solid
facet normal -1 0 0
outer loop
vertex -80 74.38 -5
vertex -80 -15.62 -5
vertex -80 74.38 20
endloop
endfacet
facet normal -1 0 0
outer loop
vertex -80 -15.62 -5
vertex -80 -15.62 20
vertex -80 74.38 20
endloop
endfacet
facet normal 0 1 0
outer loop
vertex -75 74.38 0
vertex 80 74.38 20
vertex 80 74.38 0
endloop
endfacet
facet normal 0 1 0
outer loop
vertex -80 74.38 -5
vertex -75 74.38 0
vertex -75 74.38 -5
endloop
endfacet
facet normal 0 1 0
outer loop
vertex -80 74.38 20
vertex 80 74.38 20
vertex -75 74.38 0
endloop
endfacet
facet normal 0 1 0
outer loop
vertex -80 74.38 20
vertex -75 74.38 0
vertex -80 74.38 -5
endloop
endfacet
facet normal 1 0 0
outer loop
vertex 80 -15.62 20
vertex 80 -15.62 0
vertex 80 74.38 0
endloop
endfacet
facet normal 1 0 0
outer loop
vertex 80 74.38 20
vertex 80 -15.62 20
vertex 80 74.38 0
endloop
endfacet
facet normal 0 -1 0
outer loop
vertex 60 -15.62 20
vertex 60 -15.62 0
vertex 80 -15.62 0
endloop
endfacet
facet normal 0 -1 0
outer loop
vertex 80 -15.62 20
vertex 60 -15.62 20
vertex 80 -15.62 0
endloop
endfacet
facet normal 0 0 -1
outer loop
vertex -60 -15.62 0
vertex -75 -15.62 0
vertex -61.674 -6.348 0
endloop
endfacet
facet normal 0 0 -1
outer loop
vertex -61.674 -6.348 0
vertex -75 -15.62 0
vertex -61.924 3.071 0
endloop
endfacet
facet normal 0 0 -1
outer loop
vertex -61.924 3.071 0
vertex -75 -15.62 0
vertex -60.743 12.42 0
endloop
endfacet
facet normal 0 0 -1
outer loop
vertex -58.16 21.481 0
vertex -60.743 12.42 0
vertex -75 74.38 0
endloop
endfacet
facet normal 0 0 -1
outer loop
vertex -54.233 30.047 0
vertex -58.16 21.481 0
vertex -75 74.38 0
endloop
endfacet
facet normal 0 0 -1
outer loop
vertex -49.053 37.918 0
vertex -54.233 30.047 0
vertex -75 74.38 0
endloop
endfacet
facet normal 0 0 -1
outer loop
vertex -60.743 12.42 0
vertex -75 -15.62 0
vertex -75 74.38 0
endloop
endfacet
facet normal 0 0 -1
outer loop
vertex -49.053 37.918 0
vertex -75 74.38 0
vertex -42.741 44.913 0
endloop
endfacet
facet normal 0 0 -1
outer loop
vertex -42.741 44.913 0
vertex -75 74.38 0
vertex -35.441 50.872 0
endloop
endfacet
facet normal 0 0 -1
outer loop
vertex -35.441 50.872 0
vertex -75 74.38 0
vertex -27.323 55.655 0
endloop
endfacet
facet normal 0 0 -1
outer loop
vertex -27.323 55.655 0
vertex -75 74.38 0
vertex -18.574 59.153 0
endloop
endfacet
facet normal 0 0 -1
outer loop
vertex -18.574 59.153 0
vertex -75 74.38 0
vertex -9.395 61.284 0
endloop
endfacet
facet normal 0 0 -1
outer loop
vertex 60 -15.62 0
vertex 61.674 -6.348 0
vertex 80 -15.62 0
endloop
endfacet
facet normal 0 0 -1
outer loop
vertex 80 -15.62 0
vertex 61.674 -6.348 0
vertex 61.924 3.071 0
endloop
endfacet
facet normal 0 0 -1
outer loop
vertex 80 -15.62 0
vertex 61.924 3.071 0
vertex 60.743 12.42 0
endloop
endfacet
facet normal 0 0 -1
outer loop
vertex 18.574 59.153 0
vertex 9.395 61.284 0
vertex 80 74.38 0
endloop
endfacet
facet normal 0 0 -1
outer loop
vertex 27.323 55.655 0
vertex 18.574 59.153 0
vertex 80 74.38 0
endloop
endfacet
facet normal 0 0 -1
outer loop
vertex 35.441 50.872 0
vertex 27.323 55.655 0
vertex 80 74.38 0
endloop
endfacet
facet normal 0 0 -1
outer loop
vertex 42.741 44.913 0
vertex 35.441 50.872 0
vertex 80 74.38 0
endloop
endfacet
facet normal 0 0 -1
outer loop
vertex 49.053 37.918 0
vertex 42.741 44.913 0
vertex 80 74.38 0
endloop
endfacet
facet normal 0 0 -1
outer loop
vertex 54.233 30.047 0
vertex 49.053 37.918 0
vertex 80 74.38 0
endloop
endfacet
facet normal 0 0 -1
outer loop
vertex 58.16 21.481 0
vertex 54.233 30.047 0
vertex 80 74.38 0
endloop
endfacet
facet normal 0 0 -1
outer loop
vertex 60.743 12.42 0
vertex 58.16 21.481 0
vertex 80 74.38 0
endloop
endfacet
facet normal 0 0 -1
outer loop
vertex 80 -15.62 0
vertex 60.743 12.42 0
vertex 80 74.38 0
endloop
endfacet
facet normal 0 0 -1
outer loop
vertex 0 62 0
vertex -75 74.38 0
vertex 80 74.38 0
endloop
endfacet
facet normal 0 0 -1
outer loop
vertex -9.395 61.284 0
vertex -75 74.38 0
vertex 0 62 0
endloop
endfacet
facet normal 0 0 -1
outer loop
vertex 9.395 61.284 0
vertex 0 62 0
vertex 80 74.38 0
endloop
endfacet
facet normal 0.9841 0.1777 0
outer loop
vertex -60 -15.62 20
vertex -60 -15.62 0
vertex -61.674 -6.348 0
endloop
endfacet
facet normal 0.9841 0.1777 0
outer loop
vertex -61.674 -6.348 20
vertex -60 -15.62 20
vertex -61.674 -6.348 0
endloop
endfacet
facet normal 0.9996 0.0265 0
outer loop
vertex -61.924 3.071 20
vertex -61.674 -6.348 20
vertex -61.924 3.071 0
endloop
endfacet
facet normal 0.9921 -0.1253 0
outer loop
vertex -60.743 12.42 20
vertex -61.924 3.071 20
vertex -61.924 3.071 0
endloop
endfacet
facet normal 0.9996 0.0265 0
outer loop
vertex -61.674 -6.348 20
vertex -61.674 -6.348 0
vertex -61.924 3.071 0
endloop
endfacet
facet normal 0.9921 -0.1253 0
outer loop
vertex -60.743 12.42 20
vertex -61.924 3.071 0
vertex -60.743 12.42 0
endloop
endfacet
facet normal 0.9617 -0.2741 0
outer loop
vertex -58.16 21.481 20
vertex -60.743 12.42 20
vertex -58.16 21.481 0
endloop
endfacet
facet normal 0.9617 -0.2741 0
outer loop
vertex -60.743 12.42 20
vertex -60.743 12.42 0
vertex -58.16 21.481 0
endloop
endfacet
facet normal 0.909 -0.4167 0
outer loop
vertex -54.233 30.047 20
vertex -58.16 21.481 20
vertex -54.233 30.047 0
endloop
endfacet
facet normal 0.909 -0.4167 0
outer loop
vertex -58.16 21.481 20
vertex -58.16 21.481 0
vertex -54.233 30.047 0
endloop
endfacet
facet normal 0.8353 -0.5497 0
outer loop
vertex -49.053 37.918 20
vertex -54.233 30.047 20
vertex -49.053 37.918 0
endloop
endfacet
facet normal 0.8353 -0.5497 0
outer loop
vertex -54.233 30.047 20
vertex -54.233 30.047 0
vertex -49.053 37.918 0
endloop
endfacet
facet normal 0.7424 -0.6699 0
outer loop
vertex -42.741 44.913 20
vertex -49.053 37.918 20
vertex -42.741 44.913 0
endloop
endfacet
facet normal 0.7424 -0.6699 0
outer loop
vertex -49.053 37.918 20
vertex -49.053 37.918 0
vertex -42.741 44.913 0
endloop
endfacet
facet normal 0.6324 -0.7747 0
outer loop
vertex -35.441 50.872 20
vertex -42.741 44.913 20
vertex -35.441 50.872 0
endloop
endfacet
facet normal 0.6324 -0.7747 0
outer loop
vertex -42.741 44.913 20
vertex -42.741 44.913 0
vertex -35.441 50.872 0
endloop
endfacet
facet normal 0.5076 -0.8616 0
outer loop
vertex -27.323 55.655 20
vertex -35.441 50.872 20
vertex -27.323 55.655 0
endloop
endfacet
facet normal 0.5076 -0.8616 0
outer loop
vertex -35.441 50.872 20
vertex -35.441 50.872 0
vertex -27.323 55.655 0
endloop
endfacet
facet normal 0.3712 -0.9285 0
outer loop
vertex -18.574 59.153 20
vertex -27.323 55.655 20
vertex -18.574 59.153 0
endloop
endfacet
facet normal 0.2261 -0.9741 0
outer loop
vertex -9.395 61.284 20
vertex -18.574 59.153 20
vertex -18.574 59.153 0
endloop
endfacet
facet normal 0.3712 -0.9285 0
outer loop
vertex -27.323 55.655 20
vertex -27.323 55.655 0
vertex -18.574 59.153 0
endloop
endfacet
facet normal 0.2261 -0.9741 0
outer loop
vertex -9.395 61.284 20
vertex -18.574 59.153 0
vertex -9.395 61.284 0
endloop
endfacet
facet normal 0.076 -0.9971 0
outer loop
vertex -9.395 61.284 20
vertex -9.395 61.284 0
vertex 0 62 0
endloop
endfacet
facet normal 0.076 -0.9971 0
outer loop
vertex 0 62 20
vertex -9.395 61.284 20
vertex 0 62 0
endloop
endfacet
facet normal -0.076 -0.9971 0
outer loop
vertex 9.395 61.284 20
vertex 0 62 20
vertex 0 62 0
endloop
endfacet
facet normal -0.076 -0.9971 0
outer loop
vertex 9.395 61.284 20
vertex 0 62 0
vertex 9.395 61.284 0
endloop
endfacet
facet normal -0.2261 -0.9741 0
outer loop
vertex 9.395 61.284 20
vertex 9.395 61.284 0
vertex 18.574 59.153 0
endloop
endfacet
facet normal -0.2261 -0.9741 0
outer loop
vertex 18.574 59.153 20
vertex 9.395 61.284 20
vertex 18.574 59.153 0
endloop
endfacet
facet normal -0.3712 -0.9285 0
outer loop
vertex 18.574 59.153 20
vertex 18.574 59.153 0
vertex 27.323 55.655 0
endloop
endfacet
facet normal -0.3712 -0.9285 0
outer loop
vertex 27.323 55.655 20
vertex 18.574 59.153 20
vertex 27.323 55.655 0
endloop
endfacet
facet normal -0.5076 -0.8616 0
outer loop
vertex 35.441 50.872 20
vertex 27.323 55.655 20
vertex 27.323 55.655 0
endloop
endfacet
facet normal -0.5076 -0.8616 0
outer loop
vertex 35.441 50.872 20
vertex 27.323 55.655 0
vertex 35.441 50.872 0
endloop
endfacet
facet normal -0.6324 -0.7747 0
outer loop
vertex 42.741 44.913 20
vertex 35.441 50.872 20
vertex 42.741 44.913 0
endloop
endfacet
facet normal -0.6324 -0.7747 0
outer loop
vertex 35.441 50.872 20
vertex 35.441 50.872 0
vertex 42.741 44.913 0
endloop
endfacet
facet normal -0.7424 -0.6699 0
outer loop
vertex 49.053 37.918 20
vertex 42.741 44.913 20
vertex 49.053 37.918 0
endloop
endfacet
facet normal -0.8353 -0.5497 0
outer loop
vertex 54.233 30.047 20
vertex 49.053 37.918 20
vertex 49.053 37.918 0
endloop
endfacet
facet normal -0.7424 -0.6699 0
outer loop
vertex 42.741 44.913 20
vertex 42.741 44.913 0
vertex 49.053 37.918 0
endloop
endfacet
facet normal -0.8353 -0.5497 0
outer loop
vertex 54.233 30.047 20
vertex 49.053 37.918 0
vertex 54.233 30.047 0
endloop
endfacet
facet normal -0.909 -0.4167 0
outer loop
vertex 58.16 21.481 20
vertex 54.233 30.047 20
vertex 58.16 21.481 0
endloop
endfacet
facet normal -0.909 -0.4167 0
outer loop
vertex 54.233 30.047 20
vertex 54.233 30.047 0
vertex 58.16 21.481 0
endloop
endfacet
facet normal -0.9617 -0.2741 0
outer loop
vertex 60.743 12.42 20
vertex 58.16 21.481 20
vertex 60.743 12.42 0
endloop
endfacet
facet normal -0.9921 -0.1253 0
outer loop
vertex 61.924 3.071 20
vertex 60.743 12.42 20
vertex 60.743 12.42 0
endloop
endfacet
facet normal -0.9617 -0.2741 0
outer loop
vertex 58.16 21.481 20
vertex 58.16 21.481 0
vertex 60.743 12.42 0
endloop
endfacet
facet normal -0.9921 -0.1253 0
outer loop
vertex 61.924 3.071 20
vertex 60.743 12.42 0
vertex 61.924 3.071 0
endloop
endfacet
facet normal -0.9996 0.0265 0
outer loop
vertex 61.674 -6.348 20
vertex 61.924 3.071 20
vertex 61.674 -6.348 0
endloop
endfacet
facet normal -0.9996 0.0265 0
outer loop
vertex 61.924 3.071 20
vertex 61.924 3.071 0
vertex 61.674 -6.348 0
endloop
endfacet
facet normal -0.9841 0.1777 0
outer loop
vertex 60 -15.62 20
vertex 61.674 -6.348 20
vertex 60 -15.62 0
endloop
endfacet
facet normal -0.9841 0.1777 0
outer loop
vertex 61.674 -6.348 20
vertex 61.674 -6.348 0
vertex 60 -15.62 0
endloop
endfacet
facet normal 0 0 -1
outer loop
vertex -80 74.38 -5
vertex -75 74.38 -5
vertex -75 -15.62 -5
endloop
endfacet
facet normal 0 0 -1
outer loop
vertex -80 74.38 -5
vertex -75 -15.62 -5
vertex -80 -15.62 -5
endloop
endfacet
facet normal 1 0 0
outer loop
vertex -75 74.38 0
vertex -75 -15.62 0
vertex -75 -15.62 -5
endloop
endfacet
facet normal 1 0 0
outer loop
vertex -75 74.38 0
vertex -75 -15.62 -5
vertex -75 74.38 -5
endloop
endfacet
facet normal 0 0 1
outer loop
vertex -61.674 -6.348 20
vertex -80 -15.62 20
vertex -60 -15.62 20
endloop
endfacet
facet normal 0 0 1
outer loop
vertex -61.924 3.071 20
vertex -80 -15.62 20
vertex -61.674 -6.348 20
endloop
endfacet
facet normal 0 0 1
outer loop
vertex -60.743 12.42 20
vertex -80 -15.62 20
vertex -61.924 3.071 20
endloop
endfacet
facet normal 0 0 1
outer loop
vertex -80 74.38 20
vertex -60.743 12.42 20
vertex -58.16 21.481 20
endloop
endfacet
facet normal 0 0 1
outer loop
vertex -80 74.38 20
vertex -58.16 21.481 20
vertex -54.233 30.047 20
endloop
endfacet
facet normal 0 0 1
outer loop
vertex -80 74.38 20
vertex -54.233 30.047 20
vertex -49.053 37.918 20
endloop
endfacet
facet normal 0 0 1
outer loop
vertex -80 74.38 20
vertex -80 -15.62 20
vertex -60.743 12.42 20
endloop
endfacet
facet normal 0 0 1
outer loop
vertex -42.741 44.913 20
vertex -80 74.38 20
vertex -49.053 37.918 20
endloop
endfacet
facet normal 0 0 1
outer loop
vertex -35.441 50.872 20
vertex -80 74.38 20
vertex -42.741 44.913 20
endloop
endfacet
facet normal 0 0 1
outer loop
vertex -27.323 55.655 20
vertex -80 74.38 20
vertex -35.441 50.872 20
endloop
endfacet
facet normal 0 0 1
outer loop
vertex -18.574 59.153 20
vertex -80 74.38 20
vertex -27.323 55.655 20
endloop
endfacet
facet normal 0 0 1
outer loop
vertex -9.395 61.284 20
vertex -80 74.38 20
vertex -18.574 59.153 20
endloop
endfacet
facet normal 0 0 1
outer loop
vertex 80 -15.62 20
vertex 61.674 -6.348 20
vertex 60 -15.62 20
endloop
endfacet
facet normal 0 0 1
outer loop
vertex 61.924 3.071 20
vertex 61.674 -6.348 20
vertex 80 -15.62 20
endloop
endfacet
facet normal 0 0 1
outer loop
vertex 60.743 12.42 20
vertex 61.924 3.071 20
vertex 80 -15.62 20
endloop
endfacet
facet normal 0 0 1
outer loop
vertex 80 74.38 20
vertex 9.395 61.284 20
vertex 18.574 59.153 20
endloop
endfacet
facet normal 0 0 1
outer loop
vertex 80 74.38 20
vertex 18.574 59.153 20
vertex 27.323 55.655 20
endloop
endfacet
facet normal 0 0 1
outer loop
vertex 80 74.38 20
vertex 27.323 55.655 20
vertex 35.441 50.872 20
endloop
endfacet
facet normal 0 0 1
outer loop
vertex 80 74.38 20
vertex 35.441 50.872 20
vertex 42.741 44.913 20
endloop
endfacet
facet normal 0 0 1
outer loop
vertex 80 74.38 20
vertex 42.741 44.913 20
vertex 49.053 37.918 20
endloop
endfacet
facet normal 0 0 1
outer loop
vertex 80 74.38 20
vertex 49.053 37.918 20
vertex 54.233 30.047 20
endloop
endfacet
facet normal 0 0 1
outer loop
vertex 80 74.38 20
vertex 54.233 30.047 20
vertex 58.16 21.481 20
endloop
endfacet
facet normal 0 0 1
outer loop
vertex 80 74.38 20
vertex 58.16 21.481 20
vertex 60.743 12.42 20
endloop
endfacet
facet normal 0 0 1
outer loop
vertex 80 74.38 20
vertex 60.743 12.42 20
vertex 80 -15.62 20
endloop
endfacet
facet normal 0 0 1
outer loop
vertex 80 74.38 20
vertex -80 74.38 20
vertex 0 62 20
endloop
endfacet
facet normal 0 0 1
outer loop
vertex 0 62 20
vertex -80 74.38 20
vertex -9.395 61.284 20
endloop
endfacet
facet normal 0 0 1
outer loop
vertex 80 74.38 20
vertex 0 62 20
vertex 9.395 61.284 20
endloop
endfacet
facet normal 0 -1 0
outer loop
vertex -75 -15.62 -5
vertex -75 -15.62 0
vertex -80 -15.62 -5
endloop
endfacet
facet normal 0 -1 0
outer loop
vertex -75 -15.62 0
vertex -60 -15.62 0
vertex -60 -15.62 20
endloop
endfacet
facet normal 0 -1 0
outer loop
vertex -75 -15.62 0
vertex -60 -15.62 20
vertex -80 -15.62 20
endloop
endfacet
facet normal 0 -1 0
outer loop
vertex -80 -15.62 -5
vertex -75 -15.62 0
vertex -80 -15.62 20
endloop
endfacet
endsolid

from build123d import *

# Parameters (mm, degrees)
BOSS_EXTRUDE1_DEPTH = 20
SKETCH4_W           = 5
SKETCH4_H           = 90
BOSS_EXTRUDE4_DEPTH = 5


with BuildPart() as part:
    # Sketch1 → Boss-Extrude1 (new body)
    with BuildSketch(Plane.XY):
        with BuildLine():
            Line((-80, 74.379500648), (-80, -15.620499352))
            Line((-80, -15.620499352), (-60, -15.620499352))
            ThreePointArc((-60, -15.620499352), (0, 62), (60, -15.620499352))
            Line((60, -15.620499352), (80, -15.620499352))
            Line((80, -15.620499352), (80, 74.379500648))
            Line((80, 74.379500648), (-80, 74.379500648))
        make_face()
    extrude(amount=BOSS_EXTRUDE1_DEPTH)

    # Sketch4 → Boss-Extrude4 (add)
    with BuildSketch(Plane(origin=(0, 0, 0), x_dir=(-1, 0, 0), z_dir=(0, 0, -1))):
        with Locations((77.5, 29.379500648)):
            Rectangle(SKETCH4_W, SKETCH4_H)
    extrude(amount=BOSS_EXTRUDE4_DEPTH)


solid = part.part
